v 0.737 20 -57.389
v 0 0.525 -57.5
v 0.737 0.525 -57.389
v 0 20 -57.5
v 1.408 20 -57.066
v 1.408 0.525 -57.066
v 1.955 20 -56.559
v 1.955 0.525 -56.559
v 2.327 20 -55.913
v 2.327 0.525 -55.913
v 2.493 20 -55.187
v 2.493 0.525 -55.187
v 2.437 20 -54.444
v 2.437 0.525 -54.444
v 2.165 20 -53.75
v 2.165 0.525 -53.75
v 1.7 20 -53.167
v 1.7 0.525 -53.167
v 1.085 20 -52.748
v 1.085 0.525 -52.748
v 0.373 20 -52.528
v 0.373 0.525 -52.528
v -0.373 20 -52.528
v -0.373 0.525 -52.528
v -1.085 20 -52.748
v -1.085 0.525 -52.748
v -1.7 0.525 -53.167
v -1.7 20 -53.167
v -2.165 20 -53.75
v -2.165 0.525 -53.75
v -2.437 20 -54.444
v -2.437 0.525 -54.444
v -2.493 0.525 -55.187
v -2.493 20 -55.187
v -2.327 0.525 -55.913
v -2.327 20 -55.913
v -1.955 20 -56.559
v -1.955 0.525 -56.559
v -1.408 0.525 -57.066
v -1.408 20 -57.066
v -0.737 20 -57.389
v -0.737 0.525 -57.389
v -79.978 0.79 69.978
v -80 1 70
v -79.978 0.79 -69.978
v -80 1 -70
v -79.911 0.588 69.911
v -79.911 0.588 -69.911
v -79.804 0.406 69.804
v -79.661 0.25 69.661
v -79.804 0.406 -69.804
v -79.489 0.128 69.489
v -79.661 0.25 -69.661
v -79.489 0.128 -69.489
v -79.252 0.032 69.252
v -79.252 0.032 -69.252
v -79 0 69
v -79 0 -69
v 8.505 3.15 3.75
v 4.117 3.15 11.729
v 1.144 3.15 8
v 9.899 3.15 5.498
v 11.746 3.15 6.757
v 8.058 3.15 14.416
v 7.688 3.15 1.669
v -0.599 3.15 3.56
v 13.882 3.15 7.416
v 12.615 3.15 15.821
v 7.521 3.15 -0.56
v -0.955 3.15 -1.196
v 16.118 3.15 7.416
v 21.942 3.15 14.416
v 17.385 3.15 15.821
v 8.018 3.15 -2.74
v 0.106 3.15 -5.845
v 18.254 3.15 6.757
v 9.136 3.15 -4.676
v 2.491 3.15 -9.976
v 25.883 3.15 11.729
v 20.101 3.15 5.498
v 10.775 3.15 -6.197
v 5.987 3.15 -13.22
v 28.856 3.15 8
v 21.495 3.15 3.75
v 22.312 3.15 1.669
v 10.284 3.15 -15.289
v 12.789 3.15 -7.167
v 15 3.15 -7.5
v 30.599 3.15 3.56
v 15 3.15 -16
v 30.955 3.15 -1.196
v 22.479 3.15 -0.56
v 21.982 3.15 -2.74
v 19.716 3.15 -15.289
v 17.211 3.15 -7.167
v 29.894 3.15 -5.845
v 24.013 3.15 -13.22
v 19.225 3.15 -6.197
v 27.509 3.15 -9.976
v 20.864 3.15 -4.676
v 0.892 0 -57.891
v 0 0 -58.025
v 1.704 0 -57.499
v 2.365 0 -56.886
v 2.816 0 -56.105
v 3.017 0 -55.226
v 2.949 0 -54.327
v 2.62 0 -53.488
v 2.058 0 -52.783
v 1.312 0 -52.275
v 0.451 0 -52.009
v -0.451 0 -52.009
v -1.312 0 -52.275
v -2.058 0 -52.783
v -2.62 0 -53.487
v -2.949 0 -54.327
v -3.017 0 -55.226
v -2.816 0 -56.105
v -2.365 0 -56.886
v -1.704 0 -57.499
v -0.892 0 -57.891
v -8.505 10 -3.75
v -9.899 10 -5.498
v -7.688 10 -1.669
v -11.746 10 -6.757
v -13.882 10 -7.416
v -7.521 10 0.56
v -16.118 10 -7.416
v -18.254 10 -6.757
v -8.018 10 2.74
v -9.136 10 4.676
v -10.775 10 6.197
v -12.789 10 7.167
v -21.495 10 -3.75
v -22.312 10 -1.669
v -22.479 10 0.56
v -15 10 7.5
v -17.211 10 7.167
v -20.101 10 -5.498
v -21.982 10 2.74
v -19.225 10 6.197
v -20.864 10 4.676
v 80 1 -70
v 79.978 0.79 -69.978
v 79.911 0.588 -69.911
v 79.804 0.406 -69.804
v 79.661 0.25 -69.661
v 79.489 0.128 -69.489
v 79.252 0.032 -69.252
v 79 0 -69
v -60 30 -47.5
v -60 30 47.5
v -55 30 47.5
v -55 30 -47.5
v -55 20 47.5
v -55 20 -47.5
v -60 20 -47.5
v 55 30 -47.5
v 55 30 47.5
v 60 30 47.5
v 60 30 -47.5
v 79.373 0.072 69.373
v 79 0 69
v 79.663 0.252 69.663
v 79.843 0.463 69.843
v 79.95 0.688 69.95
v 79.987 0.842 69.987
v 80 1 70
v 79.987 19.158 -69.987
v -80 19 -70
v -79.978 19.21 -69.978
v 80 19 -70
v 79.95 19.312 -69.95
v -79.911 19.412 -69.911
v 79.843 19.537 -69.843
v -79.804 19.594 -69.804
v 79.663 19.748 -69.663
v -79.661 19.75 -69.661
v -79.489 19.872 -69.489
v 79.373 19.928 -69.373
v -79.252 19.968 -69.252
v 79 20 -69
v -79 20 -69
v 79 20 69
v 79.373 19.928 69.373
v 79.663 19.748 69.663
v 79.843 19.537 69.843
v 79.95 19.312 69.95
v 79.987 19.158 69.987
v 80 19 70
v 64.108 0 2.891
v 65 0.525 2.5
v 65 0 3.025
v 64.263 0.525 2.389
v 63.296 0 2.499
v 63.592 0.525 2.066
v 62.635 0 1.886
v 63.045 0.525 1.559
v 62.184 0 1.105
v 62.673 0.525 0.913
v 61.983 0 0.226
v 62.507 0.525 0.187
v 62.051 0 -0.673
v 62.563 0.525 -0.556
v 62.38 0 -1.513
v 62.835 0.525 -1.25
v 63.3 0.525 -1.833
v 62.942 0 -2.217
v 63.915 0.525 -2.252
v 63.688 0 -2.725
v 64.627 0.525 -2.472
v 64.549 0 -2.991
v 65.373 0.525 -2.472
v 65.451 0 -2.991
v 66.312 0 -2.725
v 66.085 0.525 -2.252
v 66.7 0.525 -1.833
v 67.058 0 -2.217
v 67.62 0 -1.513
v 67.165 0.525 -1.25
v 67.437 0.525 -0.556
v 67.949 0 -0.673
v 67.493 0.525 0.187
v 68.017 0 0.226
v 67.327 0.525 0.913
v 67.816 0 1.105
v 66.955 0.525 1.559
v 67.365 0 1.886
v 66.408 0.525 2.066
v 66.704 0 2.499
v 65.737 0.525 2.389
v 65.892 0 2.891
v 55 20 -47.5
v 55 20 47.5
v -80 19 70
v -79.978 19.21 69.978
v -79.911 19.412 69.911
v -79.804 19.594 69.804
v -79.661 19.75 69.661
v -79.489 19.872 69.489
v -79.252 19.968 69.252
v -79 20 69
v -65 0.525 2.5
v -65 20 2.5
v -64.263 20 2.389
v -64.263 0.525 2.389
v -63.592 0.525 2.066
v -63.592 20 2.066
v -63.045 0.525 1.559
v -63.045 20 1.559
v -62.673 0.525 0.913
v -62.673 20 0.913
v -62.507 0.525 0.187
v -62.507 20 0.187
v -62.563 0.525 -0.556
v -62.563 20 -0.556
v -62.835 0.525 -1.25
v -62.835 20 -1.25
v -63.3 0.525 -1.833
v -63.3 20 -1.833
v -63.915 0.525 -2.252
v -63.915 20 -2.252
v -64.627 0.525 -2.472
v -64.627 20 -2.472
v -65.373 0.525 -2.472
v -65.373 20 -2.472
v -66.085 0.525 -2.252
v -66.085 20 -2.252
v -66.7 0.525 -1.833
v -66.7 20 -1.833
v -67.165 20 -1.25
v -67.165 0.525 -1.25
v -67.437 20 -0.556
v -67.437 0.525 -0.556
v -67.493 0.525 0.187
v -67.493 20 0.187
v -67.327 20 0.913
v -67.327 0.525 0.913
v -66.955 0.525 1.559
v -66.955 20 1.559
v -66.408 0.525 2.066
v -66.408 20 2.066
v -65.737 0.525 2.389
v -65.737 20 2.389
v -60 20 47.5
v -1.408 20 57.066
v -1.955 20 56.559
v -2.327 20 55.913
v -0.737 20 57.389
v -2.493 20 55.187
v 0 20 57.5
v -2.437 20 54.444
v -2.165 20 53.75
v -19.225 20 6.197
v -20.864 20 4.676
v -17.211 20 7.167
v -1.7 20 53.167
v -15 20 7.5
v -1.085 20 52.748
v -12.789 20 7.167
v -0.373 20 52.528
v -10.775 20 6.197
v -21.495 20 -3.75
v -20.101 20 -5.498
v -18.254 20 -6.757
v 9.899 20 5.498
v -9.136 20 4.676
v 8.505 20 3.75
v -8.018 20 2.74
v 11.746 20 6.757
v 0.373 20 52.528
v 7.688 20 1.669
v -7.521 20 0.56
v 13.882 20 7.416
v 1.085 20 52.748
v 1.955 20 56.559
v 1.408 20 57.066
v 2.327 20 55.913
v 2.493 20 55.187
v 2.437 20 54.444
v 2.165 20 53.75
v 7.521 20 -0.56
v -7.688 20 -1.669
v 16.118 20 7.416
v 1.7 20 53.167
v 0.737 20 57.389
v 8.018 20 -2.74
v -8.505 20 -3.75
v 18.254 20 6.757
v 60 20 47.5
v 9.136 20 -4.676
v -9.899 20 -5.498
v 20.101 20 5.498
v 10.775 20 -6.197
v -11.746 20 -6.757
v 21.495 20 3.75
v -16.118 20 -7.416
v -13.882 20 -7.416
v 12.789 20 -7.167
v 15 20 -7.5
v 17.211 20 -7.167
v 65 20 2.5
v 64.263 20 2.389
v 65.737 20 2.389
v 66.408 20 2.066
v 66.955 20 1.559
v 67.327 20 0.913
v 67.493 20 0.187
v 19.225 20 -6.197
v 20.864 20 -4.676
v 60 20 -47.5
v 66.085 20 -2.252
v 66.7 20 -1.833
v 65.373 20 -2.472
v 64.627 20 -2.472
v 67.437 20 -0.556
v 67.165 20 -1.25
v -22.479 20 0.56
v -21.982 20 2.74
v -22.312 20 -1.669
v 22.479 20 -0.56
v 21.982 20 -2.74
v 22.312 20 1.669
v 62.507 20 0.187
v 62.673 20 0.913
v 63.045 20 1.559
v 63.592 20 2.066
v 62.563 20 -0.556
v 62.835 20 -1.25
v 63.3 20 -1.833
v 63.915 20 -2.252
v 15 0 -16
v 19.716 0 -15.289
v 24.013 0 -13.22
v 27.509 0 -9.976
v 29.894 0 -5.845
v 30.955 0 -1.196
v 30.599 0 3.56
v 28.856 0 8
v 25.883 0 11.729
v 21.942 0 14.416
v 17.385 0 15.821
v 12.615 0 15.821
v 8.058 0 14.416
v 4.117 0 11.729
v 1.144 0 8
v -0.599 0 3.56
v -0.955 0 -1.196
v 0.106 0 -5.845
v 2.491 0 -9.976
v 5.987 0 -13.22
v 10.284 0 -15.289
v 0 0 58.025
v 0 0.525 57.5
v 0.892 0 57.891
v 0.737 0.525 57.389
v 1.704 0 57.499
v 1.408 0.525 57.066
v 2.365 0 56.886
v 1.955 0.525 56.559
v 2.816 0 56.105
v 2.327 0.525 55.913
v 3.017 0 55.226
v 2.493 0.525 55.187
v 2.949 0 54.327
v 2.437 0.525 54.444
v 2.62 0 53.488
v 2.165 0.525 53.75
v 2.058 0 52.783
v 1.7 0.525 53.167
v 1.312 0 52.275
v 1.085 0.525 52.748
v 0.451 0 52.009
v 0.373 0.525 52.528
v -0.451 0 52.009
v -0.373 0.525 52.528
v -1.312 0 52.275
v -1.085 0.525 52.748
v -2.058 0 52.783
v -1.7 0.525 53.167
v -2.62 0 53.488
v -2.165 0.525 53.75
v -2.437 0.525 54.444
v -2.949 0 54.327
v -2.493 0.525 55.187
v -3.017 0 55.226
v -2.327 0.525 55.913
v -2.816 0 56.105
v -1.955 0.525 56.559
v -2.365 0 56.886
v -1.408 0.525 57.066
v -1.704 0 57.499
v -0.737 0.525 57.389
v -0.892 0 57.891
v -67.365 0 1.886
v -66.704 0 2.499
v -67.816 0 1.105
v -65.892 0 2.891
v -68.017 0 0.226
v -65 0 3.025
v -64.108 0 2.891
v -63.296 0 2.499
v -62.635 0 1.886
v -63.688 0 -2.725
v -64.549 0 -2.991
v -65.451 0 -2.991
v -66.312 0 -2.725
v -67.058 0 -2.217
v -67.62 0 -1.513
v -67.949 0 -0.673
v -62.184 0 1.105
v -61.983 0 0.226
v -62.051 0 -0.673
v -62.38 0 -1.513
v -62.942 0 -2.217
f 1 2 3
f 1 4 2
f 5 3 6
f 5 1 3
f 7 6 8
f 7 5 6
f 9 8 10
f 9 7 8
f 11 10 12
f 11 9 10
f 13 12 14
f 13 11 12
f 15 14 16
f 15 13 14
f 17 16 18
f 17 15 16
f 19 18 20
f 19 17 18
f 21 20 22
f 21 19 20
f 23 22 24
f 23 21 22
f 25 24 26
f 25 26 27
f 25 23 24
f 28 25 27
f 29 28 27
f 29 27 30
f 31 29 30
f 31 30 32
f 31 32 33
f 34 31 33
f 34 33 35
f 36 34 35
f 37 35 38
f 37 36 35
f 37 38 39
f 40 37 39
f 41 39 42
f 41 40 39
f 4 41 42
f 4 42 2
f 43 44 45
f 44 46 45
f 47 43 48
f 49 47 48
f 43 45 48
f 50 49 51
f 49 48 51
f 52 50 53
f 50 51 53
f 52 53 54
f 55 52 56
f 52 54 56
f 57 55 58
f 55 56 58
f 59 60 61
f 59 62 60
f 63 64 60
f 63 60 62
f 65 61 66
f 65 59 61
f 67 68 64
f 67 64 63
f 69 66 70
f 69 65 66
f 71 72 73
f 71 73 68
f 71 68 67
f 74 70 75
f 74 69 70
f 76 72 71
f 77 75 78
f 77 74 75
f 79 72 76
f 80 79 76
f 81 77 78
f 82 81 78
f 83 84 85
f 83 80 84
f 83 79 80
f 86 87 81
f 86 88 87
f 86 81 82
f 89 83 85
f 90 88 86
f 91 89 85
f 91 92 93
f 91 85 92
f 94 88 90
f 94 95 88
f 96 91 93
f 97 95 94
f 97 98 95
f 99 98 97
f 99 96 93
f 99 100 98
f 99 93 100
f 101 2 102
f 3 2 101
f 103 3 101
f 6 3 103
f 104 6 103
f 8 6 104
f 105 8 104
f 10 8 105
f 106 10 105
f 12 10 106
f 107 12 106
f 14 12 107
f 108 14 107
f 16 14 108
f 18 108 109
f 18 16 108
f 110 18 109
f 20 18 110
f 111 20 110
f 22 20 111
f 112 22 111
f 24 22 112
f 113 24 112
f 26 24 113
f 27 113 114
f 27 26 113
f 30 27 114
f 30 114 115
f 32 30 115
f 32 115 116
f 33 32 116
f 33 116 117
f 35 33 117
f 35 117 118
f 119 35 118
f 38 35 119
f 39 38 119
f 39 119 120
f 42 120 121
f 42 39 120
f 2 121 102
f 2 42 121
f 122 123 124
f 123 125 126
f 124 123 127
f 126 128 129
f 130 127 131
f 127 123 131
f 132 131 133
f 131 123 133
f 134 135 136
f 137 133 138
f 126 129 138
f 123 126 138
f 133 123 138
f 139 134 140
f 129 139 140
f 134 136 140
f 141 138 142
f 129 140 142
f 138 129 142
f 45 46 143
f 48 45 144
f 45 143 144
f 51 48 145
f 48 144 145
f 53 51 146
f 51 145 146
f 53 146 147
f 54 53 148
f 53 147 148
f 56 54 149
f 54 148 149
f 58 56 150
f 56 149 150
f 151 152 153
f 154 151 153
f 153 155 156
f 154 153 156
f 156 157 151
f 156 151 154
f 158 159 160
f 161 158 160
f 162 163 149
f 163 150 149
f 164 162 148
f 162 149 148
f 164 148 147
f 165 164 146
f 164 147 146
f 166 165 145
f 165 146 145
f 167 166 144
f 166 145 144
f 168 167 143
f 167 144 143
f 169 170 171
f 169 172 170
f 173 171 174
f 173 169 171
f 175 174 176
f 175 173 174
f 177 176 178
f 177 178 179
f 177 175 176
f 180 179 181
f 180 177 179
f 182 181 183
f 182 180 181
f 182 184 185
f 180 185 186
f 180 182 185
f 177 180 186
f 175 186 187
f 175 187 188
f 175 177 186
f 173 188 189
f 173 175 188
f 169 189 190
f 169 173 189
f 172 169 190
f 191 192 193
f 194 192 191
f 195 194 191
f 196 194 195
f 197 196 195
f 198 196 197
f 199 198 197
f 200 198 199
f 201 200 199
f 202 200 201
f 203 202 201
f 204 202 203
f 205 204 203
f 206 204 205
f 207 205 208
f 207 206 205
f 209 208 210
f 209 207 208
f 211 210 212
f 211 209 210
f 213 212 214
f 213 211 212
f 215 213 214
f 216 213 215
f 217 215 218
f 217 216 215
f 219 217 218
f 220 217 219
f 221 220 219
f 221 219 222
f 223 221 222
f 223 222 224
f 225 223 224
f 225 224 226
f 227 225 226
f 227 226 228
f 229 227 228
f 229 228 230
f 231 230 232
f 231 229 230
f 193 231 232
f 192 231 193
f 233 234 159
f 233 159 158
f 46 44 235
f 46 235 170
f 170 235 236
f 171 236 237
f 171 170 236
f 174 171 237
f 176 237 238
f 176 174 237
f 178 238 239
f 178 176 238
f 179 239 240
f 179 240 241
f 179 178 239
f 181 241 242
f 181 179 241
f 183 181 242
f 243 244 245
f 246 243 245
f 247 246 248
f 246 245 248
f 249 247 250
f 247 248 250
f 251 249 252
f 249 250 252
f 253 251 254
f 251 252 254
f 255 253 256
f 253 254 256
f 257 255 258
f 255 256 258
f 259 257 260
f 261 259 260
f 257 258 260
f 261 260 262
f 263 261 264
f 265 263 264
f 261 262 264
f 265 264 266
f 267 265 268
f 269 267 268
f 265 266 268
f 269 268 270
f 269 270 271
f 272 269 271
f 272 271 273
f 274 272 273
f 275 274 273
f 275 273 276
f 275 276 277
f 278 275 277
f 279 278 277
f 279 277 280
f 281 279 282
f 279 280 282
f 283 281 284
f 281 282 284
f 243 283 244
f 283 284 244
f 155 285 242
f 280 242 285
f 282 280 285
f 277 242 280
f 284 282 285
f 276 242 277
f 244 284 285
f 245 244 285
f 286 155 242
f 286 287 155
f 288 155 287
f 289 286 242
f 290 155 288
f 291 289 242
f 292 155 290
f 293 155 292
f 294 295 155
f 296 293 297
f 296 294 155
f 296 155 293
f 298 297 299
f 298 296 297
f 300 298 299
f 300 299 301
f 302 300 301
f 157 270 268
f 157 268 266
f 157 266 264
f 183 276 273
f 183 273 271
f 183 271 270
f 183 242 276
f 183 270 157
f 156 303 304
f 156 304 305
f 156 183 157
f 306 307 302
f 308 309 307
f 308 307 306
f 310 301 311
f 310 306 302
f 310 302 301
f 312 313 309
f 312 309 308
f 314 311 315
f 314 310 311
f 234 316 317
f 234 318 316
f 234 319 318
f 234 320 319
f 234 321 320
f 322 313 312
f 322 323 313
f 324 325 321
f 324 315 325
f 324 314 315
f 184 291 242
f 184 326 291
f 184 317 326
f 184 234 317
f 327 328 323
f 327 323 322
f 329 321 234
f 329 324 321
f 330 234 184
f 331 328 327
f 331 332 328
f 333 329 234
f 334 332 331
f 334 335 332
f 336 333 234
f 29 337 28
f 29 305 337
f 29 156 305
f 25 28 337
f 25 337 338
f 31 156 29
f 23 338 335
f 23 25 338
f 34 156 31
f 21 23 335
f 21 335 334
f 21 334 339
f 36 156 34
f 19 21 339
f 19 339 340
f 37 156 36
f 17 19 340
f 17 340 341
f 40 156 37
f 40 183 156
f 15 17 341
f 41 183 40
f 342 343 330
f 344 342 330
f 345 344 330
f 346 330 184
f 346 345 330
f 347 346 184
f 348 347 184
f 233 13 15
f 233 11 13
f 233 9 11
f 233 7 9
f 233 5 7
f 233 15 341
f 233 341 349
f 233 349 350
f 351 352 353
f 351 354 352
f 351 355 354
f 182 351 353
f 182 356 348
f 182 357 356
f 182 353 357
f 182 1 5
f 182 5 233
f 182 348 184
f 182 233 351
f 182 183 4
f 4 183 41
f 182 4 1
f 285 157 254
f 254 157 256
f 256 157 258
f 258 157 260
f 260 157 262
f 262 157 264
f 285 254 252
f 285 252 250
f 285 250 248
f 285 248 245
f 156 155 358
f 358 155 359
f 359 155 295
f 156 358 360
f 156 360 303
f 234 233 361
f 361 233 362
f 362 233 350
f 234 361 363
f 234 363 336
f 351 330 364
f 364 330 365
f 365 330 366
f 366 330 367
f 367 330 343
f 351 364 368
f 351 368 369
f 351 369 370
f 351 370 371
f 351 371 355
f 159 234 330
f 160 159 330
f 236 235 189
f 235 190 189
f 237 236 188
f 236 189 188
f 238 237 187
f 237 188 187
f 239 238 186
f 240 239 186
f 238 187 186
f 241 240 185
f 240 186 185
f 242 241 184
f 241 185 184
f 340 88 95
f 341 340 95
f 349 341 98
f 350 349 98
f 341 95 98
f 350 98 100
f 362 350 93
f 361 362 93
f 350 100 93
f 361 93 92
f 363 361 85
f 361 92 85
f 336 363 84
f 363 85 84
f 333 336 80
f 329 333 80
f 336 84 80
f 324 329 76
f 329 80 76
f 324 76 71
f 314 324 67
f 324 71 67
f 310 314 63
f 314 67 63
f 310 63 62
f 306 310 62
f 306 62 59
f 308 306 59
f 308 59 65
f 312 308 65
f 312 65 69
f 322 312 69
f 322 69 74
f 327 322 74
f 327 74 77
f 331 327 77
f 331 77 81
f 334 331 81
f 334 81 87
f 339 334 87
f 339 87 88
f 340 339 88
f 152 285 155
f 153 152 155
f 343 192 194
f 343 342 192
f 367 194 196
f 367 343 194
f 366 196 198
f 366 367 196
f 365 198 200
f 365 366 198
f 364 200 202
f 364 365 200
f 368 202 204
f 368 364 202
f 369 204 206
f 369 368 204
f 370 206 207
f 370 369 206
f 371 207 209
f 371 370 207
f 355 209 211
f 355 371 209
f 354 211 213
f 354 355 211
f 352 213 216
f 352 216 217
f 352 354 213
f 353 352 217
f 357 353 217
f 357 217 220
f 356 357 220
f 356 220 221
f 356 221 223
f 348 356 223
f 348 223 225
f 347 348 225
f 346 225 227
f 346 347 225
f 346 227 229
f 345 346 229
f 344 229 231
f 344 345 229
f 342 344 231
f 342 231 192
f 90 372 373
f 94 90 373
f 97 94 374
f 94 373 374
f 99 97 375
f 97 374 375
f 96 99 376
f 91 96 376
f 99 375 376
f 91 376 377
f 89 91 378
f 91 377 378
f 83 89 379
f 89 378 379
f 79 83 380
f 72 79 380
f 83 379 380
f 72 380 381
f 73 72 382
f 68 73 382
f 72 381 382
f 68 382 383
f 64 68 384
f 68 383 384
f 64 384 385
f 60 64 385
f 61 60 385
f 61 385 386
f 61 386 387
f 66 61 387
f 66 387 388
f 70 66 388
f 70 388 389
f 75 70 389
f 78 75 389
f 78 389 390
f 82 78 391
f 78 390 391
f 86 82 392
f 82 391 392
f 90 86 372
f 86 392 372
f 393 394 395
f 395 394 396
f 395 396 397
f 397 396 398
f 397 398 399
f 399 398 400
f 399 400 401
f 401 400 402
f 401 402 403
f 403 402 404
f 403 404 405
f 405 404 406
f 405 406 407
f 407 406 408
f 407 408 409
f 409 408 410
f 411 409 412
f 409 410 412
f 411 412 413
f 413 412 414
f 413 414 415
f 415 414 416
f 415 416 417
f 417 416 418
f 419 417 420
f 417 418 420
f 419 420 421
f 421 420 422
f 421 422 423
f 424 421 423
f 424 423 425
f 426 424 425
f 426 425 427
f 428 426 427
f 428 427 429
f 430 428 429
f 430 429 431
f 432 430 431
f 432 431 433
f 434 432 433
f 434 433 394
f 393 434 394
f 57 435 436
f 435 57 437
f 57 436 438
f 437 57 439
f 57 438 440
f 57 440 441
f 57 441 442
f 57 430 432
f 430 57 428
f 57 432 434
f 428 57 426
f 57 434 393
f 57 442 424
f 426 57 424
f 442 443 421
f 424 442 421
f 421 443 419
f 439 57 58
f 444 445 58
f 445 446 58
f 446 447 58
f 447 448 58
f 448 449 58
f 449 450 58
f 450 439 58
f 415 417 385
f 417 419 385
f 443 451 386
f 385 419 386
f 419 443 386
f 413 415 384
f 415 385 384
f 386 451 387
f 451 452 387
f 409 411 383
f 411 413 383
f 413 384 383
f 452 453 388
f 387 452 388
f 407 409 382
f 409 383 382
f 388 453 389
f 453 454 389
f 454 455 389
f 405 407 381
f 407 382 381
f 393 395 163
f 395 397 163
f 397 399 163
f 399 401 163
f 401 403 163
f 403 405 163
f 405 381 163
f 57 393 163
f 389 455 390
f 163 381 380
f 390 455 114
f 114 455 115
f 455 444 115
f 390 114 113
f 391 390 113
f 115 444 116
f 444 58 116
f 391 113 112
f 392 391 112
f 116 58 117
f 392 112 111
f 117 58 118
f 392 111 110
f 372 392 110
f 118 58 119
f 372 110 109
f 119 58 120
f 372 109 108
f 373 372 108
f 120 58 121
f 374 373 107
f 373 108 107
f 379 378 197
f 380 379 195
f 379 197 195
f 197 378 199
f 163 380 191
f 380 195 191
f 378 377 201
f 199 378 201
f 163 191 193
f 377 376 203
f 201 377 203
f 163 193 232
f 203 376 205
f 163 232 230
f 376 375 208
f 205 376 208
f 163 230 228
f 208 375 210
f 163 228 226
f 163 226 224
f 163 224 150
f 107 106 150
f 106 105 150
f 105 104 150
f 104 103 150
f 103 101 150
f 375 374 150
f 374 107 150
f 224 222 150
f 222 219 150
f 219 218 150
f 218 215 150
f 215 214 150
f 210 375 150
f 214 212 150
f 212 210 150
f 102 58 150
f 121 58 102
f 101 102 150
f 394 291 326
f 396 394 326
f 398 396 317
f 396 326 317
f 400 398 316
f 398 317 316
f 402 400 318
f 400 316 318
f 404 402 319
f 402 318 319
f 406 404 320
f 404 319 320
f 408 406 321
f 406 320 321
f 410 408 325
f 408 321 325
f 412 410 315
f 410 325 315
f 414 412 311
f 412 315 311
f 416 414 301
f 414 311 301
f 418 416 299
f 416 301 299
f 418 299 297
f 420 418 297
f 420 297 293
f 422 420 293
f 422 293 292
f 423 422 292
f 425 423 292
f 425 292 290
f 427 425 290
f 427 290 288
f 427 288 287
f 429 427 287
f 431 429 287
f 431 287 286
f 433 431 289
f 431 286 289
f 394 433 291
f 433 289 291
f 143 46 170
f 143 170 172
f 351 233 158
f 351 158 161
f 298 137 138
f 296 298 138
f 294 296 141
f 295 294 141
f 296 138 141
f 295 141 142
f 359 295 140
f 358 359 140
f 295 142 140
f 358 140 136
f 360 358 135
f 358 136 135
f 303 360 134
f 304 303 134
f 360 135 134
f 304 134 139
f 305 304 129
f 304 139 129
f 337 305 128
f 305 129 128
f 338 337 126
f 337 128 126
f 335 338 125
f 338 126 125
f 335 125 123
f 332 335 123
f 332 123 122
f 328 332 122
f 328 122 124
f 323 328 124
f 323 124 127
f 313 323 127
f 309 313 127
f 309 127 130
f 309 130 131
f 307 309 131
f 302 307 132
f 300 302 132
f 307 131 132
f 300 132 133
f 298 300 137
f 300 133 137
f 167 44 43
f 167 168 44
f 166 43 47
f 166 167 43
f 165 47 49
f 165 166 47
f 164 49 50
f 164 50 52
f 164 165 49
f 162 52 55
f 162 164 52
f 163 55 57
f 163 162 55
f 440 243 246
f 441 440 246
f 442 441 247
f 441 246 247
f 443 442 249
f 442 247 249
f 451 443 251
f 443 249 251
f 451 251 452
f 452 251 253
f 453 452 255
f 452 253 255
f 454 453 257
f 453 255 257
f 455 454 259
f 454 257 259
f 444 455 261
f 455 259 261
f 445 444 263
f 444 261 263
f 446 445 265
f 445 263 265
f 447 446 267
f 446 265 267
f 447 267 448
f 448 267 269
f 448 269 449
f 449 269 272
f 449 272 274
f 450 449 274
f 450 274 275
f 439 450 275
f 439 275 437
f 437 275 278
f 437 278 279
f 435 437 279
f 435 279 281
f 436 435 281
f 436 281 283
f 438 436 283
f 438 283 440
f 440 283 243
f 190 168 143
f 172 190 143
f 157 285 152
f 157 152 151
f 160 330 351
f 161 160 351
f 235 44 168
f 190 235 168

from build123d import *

# Parameters (mm, degrees)
SKETCH1_W                   = 160
SKETCH1_H                   = 140
LID_EXTRUDE_DEPTH           = 20
SKETCH3_W                   = 5
SKETCH3_H                   = 95
LOCATION_BAR_EXTRUDE_DEPTH  = 10
M6_TAPPED_HOLE1_D           = 5
M6_TAPPED_HOLE1_CSINK_D     = 6.05
M6_TAPPED_HOLE1_CSINK_ANGLE = 90
SKETCH6_R                   = 16
MOTOR_HOLE_CUT_DEPTH        = 3.15
FILLET2_R                   = 1
SKETCH7_R                   = 7.5
CUT_EXTRUDE1_DEPTH          = 111.453610172
CUT_EXTRUDE3_START          = -10
SKETCH9_R                   = 7.5
CUT_EXTRUDE3_DEPTH          = 10


with BuildPart() as part:
    # Sketch1 → LID_EXTRUDE (new body)
    with BuildSketch(Plane(origin=(0, 0, 0), x_dir=(1, 0, 0), z_dir=(0, 1, 0))):
        Rectangle(SKETCH1_W, SKETCH1_H)
    extrude(amount=LID_EXTRUDE_DEPTH)

    # Sketch3 → LOCATION_BAR_EXTRUDE (add)
    with BuildSketch(Plane(origin=(0, 20, 0), x_dir=(1, 0, 0), z_dir=(0, 1, 0))):
        with Locations((-57.5, 0)):
            Rectangle(SKETCH3_W, SKETCH3_H)
        with Locations((57.5, 0)):
            Rectangle(SKETCH3_W, SKETCH3_H)
    extrude(amount=LOCATION_BAR_EXTRUDE_DEPTH)

    # M6 Tapped Hole1 (through all)
    with Locations(Plane(origin=(0, 0, 55), x_dir=(0, 0, -1), z_dir=(0, -1, 0))):
        with Locations((0, 0), (55, -65)):
            m6_tapped_hole1 = CounterSinkHole(M6_TAPPED_HOLE1_D / 2, M6_TAPPED_HOLE1_CSINK_D / 2, counter_sink_angle=M6_TAPPED_HOLE1_CSINK_ANGLE)

    # Mirror1: M6 Tapped Hole1 across plane
    add(m6_tapped_hole1.mirror(Plane(origin=(0, 0, 0), x_dir=(0, 0, 1), z_dir=(1, 0, 0))), mode=Mode.SUBTRACT)

    # Mirror1 at the second plane: M6 Tapped Hole1 across plane
    add(m6_tapped_hole1.mirror(Plane.XY), mode=Mode.SUBTRACT)

    # Sketch6 → MOTOR_HOLE_CUT (cut)
    with BuildSketch(Plane.XZ):
        with Locations(Location((15, 0, 0), (0, 0, 270))):
            Circle(SKETCH6_R)
    extrude(amount=-MOTOR_HOLE_CUT_DEPTH, mode=Mode.SUBTRACT)

    # Fillet2
    fillet2_edges = [part.edges().sort_by_distance(p)[0] for p in [
        (80, 20, 0),
        (0, 20, -70),
        (-80, 20, 0),
        (0, 0, -70),
        (80, 0, 0),
        (0, 0, 70),
        (-80, 0, 0),
        (0, 20, 70),
    ]]
    fillet(fillet2_edges, radius=FILLET2_R)

    # Sketch7 → Cut-Extrude1 (cut, through all)
    with BuildSketch(Plane.XZ):
        with Locations(Location((15, 0, 0), (0, 0, 270))):
            Circle(SKETCH7_R)
    extrude(amount=-CUT_EXTRUDE1_DEPTH, mode=Mode.SUBTRACT)

    # Sketch9 → Cut-Extrude3 (cut)
    with BuildSketch(Plane.XZ.offset(CUT_EXTRUDE3_START)):
        with Locations(Location((-15, 0, 0), (0, 0, 90))):
            Circle(SKETCH9_R)
    extrude(amount=-CUT_EXTRUDE3_DEPTH, mode=Mode.SUBTRACT)


solid = part.part
